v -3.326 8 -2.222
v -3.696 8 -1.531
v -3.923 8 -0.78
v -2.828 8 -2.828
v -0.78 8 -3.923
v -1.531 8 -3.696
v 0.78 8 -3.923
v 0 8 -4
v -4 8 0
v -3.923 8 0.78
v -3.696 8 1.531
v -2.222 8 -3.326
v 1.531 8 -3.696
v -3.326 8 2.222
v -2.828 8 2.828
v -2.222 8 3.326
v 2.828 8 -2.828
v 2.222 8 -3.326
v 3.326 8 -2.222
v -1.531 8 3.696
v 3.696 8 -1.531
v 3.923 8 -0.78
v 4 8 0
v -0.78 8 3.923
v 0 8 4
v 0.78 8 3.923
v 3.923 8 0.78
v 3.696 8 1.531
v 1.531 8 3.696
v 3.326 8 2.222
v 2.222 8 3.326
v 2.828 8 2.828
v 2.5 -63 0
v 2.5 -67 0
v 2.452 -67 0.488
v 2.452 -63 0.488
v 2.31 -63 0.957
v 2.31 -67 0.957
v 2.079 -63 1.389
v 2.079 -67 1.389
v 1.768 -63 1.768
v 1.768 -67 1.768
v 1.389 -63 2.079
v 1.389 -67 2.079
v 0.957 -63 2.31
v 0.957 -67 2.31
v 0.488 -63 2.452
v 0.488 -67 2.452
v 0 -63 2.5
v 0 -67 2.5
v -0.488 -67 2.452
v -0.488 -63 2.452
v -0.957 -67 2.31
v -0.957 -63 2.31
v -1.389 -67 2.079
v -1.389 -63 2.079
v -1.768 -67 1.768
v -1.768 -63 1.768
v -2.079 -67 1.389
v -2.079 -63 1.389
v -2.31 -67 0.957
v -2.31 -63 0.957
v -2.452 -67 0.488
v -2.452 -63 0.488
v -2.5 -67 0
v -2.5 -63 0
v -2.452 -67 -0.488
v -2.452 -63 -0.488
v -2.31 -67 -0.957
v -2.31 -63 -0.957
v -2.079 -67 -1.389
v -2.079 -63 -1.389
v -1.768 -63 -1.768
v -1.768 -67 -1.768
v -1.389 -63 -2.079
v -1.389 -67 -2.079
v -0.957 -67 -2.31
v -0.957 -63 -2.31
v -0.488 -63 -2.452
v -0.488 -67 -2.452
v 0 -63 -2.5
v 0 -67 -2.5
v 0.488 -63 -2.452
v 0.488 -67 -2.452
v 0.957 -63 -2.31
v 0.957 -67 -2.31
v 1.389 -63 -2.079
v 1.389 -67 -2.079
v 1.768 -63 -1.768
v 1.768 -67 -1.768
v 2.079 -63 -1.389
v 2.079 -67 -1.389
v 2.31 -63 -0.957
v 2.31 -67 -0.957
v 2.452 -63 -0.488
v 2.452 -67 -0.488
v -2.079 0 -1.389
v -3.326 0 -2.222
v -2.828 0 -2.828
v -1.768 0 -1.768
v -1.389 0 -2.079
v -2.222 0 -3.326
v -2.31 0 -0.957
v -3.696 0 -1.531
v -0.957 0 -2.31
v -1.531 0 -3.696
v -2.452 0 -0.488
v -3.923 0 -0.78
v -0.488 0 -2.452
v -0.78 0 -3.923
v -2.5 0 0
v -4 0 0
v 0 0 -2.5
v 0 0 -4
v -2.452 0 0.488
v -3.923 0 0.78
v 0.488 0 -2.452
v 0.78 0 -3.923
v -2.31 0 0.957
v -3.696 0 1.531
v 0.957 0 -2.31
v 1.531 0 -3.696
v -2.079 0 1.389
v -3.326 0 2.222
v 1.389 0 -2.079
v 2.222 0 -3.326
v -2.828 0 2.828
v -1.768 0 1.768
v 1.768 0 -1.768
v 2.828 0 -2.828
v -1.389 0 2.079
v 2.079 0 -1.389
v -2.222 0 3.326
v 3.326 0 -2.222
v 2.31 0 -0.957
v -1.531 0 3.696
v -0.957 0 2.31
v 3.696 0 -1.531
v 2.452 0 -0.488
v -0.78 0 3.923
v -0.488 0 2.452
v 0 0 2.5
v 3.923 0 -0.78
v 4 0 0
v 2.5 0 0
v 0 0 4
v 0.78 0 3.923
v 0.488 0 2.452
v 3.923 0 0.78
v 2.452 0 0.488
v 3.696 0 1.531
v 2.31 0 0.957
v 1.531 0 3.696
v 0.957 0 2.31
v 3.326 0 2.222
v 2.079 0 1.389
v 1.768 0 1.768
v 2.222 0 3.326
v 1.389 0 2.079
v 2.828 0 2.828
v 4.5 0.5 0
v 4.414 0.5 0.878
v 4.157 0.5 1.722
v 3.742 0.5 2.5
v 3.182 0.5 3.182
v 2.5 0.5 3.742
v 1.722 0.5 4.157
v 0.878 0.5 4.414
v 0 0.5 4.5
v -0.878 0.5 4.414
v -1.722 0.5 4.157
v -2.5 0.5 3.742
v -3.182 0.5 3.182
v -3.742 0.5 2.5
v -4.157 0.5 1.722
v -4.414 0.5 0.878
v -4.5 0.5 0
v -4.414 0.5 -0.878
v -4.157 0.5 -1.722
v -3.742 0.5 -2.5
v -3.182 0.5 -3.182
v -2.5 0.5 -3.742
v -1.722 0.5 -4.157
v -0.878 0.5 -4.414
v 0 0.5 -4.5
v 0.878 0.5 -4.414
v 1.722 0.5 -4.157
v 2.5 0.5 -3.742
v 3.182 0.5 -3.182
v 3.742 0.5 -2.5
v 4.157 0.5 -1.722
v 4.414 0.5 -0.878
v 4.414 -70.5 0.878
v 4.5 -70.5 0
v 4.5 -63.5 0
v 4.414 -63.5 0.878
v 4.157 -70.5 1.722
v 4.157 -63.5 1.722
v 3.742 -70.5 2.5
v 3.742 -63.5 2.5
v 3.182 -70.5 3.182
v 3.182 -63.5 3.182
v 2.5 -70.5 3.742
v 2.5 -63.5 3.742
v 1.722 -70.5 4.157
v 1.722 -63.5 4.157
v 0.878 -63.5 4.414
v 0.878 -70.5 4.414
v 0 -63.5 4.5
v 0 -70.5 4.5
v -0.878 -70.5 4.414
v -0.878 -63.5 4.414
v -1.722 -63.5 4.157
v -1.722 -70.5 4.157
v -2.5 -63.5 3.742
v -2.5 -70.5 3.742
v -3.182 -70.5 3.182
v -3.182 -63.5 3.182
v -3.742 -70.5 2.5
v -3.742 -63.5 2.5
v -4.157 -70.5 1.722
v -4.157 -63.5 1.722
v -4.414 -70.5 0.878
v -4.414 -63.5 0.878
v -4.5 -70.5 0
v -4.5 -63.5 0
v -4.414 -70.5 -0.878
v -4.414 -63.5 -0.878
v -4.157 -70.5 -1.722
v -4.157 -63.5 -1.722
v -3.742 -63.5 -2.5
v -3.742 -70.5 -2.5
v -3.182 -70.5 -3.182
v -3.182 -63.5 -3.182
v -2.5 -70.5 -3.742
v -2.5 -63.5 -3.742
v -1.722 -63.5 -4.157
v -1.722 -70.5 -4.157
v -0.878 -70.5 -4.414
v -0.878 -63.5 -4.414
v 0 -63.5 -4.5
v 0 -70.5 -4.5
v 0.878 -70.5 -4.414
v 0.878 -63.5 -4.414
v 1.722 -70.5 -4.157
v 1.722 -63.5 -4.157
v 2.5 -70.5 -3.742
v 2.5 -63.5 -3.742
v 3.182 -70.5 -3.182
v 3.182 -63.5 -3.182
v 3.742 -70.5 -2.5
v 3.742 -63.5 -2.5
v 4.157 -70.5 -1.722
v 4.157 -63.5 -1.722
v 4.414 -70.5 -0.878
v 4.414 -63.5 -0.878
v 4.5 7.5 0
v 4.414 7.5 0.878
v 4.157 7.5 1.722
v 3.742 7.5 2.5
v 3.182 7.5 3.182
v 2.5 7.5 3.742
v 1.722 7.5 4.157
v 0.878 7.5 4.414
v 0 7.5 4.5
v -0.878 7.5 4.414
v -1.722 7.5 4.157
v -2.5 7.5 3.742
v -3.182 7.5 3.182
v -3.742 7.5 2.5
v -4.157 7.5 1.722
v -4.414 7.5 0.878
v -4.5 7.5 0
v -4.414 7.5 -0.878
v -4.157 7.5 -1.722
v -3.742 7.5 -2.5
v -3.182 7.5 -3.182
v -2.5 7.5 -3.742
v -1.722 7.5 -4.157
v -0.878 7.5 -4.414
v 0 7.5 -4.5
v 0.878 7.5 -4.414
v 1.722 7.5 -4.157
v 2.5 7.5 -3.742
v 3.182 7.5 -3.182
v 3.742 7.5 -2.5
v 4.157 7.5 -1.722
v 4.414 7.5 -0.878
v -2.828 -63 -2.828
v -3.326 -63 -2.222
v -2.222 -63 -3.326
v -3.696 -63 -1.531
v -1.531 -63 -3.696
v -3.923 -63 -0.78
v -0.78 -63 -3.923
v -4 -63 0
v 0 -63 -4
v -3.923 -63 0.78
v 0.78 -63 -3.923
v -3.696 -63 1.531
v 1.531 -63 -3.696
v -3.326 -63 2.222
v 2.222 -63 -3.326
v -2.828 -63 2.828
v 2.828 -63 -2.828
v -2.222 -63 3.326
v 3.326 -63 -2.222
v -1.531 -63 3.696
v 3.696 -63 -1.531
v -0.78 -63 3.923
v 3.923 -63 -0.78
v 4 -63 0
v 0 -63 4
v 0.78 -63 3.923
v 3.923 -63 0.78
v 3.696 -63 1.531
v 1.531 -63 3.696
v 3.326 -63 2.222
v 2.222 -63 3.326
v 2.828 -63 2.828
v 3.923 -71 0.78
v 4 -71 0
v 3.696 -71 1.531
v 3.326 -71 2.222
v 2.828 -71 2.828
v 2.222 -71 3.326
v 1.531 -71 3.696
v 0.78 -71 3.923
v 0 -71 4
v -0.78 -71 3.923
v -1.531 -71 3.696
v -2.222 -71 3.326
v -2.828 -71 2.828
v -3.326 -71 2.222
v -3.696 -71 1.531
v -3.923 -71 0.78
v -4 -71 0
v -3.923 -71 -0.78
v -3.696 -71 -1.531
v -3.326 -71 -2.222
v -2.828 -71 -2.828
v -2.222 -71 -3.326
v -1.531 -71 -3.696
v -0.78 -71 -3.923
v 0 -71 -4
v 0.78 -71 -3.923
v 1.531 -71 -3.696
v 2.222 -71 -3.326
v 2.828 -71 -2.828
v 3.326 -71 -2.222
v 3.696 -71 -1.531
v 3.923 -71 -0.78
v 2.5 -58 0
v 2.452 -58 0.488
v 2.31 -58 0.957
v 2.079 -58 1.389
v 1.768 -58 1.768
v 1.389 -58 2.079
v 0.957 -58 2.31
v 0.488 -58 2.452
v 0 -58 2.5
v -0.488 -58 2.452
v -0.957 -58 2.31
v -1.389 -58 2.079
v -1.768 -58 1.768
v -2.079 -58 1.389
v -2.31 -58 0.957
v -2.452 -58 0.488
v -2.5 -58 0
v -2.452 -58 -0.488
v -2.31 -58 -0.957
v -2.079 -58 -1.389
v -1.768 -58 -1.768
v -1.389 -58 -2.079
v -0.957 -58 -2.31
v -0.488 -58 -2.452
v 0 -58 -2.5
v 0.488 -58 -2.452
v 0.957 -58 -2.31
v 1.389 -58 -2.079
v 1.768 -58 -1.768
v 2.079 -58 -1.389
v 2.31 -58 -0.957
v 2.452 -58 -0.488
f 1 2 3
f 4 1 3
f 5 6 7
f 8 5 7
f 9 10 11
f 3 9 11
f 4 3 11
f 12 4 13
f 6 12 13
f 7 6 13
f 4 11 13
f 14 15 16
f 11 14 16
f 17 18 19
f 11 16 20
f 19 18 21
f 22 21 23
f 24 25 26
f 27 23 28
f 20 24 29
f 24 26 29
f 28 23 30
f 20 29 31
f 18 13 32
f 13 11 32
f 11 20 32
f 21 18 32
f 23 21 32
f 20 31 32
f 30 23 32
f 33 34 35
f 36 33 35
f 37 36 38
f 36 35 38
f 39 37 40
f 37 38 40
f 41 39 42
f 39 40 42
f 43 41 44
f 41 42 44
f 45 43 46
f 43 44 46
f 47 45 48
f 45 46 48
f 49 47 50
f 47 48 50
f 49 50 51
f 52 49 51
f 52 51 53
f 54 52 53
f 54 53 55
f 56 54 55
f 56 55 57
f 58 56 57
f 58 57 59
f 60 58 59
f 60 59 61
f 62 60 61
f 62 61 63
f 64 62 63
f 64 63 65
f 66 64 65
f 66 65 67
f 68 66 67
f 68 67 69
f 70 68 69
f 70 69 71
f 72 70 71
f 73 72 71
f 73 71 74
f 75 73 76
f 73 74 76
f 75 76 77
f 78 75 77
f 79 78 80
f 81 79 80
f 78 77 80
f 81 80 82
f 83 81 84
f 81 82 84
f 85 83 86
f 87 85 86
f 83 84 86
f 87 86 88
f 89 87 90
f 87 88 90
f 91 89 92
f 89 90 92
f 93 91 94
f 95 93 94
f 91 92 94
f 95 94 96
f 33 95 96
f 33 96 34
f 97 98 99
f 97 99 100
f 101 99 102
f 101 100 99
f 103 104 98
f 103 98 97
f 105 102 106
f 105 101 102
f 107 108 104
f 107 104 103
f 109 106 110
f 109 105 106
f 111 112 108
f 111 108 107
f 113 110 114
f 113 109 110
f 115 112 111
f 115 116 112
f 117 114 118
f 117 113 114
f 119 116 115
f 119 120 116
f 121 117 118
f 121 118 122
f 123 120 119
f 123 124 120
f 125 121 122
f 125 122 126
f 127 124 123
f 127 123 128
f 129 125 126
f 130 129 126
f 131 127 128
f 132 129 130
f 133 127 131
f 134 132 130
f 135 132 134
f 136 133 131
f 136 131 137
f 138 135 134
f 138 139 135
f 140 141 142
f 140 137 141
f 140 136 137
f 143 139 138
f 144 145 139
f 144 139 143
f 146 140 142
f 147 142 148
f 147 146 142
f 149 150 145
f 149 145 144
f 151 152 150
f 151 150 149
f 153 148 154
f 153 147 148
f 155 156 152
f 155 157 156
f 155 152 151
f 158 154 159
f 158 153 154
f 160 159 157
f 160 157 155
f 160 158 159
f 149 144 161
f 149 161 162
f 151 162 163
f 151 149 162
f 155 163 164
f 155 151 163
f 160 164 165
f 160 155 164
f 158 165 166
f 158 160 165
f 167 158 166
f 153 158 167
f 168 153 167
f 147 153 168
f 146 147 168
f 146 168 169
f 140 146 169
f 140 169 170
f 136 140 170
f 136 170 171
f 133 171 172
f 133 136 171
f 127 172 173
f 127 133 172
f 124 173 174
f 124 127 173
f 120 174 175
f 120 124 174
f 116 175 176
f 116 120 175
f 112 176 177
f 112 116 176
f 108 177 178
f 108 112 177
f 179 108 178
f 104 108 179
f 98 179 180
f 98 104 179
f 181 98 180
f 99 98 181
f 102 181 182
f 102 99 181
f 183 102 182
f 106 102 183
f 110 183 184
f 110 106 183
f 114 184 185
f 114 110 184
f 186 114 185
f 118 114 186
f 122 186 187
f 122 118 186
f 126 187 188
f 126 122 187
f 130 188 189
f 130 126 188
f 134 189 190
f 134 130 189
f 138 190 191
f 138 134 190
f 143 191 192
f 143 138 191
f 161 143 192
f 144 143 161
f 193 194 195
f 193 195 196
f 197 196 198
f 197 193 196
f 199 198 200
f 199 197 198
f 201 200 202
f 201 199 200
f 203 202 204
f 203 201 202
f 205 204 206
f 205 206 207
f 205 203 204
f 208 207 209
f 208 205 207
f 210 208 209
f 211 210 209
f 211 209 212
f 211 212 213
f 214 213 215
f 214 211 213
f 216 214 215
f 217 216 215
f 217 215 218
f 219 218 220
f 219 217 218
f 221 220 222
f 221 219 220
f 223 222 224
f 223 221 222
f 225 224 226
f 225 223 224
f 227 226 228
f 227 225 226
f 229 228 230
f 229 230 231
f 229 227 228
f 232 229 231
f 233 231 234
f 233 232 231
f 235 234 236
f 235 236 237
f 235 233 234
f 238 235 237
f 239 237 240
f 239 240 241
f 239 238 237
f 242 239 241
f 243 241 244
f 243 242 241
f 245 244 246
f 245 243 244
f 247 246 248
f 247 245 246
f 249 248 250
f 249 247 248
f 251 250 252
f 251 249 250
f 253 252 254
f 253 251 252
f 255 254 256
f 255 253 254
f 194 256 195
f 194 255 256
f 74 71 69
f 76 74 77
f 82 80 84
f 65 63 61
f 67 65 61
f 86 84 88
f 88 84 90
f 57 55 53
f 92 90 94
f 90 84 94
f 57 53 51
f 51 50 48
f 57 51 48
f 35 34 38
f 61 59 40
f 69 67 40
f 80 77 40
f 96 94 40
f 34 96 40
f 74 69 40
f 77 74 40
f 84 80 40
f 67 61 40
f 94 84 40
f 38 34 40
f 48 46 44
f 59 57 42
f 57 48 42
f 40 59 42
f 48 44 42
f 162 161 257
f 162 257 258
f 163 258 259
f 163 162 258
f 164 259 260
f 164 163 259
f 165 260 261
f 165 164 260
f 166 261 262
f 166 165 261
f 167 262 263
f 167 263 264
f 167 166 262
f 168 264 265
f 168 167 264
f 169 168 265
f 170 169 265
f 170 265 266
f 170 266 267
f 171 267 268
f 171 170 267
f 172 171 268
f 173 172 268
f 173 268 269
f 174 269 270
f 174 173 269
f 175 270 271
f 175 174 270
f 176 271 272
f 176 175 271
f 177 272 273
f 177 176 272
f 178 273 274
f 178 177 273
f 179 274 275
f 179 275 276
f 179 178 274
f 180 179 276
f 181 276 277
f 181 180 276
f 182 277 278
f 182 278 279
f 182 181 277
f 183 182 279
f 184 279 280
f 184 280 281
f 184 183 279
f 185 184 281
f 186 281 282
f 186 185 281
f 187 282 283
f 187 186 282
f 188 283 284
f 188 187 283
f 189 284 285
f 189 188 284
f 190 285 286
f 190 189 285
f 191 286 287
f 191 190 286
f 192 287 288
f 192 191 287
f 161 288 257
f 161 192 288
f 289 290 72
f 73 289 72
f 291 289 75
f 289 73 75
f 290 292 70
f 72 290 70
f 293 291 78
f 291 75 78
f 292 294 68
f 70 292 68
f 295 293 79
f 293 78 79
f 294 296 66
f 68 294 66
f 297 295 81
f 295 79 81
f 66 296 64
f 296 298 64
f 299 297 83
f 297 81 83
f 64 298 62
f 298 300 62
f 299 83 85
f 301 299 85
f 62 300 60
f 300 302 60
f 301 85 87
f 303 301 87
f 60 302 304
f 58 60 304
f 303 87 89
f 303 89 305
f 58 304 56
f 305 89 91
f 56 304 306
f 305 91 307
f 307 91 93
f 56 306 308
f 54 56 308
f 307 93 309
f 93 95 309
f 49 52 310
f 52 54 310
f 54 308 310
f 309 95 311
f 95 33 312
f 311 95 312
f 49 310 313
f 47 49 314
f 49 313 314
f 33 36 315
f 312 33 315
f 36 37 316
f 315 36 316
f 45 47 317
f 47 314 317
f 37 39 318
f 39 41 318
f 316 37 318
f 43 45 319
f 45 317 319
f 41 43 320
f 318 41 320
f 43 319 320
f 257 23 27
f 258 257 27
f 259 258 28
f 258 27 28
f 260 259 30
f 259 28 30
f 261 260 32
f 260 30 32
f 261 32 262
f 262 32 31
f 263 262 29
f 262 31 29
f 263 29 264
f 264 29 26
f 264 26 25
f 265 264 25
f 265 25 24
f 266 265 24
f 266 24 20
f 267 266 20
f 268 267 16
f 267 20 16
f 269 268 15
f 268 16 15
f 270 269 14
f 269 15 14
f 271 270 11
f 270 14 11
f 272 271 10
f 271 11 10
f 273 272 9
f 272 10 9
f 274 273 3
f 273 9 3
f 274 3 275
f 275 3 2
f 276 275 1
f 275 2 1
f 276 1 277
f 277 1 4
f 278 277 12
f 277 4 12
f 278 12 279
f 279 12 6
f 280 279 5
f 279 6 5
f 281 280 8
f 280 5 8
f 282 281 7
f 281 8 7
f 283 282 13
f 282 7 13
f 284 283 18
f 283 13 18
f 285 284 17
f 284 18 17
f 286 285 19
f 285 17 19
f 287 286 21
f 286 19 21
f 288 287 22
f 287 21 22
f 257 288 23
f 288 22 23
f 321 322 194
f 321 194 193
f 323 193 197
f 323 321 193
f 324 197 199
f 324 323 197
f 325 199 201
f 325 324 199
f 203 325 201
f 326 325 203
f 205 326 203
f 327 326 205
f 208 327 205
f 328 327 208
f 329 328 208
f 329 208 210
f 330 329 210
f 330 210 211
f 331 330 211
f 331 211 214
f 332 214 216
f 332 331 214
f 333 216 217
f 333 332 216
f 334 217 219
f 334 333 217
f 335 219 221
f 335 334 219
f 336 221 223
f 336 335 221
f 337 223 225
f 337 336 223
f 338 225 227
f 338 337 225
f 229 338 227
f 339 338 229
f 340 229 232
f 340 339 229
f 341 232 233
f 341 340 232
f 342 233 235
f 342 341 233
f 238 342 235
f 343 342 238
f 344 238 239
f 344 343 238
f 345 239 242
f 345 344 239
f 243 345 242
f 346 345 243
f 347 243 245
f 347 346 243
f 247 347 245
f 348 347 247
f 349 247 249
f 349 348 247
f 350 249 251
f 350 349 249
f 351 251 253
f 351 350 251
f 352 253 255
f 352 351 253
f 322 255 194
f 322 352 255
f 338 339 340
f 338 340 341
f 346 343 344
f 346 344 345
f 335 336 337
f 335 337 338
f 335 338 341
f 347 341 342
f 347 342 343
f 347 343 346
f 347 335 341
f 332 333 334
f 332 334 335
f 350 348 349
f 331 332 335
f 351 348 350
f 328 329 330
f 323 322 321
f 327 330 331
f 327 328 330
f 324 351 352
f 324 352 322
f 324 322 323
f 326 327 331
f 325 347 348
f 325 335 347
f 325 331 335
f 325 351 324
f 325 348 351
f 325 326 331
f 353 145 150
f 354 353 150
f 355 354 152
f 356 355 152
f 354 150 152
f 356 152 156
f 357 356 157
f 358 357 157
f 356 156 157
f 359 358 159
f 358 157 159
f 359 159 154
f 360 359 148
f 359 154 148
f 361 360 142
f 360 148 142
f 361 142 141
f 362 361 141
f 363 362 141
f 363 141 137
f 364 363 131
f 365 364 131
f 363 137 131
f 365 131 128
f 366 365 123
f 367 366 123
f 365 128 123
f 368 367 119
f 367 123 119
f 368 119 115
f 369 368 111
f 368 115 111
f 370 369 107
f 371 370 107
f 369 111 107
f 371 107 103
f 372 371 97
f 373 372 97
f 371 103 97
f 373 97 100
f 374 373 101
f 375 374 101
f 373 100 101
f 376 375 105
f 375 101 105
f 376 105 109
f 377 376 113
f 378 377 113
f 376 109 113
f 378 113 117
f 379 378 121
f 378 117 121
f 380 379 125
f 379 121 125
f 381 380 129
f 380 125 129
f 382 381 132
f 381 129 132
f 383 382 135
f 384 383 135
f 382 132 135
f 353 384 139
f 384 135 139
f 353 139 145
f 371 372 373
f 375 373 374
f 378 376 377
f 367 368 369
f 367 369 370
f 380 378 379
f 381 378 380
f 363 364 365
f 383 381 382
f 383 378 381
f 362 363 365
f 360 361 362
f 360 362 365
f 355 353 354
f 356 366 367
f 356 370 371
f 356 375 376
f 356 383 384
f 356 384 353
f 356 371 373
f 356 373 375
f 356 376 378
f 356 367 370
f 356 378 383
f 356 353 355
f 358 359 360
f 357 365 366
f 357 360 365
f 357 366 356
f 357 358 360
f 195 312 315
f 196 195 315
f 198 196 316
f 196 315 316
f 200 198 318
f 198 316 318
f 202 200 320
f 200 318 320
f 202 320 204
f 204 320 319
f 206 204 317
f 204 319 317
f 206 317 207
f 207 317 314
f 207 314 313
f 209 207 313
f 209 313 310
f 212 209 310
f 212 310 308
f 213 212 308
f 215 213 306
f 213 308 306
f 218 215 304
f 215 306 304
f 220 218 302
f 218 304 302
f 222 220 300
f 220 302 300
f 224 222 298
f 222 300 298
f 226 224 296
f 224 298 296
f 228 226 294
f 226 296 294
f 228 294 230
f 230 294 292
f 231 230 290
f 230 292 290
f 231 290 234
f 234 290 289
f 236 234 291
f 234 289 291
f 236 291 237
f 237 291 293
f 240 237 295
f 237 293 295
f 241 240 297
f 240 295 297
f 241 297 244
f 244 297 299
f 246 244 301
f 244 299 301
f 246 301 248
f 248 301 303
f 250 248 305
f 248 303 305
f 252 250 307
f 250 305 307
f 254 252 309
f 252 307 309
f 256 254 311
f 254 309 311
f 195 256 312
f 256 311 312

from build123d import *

# Parameters (mm, degrees)
F0_R     = 2.5
F1_DEPTH = 58
F0_R_2   = 4.5
F2_DEPTH = 8
F3_SIZE  = 0.5
F5_R     = 4.5
F5_R_2   = 2.5
F6_DEPTH = 8
F7_SIZE  = 0.5
F8_DEPTH = 4


with BuildPart() as f1:
    # F0 (on Front) → F1 (new body)
    with BuildSketch(Plane.XZ):
        Circle(F0_R)
    extrude(amount=F1_DEPTH)

    # F0 (on Front) → F2 (join)
    with BuildSketch(Plane.XZ):
        Circle(F0_R_2)
        Circle(F0_R, mode=Mode.SUBTRACT)
        Circle(F0_R)
    extrude(amount=-F2_DEPTH)

    # F3
    f3_edges = [f1.edges().sort_by_distance(p)[0] for p in [
        (-4.5, 8, 0),
        (-4.5, 0, 0),
    ]]
    chamfer(f3_edges, length=F3_SIZE)


with BuildPart() as f6:
    # F5 (on offset) → F6 (new body)
    with BuildSketch(Plane.XZ.offset(71)):
        Circle(F5_R)
        Circle(F5_R_2, mode=Mode.SUBTRACT)
    extrude(amount=-F6_DEPTH)

    # F7
    f7_edges = [f6.edges().sort_by_distance(p)[0] for p in [
        (-4.5, -63, 0),
        (-4.5, -71, 0),
    ]]
    chamfer(f7_edges, length=F7_SIZE)

    # F5 (on offset) → F8 (join)
    with BuildSketch(Plane.XZ.offset(71)):
        Circle(F5_R_2)
    extrude(amount=-F8_DEPTH)


solid = Compound([f1.part, f6.part])
